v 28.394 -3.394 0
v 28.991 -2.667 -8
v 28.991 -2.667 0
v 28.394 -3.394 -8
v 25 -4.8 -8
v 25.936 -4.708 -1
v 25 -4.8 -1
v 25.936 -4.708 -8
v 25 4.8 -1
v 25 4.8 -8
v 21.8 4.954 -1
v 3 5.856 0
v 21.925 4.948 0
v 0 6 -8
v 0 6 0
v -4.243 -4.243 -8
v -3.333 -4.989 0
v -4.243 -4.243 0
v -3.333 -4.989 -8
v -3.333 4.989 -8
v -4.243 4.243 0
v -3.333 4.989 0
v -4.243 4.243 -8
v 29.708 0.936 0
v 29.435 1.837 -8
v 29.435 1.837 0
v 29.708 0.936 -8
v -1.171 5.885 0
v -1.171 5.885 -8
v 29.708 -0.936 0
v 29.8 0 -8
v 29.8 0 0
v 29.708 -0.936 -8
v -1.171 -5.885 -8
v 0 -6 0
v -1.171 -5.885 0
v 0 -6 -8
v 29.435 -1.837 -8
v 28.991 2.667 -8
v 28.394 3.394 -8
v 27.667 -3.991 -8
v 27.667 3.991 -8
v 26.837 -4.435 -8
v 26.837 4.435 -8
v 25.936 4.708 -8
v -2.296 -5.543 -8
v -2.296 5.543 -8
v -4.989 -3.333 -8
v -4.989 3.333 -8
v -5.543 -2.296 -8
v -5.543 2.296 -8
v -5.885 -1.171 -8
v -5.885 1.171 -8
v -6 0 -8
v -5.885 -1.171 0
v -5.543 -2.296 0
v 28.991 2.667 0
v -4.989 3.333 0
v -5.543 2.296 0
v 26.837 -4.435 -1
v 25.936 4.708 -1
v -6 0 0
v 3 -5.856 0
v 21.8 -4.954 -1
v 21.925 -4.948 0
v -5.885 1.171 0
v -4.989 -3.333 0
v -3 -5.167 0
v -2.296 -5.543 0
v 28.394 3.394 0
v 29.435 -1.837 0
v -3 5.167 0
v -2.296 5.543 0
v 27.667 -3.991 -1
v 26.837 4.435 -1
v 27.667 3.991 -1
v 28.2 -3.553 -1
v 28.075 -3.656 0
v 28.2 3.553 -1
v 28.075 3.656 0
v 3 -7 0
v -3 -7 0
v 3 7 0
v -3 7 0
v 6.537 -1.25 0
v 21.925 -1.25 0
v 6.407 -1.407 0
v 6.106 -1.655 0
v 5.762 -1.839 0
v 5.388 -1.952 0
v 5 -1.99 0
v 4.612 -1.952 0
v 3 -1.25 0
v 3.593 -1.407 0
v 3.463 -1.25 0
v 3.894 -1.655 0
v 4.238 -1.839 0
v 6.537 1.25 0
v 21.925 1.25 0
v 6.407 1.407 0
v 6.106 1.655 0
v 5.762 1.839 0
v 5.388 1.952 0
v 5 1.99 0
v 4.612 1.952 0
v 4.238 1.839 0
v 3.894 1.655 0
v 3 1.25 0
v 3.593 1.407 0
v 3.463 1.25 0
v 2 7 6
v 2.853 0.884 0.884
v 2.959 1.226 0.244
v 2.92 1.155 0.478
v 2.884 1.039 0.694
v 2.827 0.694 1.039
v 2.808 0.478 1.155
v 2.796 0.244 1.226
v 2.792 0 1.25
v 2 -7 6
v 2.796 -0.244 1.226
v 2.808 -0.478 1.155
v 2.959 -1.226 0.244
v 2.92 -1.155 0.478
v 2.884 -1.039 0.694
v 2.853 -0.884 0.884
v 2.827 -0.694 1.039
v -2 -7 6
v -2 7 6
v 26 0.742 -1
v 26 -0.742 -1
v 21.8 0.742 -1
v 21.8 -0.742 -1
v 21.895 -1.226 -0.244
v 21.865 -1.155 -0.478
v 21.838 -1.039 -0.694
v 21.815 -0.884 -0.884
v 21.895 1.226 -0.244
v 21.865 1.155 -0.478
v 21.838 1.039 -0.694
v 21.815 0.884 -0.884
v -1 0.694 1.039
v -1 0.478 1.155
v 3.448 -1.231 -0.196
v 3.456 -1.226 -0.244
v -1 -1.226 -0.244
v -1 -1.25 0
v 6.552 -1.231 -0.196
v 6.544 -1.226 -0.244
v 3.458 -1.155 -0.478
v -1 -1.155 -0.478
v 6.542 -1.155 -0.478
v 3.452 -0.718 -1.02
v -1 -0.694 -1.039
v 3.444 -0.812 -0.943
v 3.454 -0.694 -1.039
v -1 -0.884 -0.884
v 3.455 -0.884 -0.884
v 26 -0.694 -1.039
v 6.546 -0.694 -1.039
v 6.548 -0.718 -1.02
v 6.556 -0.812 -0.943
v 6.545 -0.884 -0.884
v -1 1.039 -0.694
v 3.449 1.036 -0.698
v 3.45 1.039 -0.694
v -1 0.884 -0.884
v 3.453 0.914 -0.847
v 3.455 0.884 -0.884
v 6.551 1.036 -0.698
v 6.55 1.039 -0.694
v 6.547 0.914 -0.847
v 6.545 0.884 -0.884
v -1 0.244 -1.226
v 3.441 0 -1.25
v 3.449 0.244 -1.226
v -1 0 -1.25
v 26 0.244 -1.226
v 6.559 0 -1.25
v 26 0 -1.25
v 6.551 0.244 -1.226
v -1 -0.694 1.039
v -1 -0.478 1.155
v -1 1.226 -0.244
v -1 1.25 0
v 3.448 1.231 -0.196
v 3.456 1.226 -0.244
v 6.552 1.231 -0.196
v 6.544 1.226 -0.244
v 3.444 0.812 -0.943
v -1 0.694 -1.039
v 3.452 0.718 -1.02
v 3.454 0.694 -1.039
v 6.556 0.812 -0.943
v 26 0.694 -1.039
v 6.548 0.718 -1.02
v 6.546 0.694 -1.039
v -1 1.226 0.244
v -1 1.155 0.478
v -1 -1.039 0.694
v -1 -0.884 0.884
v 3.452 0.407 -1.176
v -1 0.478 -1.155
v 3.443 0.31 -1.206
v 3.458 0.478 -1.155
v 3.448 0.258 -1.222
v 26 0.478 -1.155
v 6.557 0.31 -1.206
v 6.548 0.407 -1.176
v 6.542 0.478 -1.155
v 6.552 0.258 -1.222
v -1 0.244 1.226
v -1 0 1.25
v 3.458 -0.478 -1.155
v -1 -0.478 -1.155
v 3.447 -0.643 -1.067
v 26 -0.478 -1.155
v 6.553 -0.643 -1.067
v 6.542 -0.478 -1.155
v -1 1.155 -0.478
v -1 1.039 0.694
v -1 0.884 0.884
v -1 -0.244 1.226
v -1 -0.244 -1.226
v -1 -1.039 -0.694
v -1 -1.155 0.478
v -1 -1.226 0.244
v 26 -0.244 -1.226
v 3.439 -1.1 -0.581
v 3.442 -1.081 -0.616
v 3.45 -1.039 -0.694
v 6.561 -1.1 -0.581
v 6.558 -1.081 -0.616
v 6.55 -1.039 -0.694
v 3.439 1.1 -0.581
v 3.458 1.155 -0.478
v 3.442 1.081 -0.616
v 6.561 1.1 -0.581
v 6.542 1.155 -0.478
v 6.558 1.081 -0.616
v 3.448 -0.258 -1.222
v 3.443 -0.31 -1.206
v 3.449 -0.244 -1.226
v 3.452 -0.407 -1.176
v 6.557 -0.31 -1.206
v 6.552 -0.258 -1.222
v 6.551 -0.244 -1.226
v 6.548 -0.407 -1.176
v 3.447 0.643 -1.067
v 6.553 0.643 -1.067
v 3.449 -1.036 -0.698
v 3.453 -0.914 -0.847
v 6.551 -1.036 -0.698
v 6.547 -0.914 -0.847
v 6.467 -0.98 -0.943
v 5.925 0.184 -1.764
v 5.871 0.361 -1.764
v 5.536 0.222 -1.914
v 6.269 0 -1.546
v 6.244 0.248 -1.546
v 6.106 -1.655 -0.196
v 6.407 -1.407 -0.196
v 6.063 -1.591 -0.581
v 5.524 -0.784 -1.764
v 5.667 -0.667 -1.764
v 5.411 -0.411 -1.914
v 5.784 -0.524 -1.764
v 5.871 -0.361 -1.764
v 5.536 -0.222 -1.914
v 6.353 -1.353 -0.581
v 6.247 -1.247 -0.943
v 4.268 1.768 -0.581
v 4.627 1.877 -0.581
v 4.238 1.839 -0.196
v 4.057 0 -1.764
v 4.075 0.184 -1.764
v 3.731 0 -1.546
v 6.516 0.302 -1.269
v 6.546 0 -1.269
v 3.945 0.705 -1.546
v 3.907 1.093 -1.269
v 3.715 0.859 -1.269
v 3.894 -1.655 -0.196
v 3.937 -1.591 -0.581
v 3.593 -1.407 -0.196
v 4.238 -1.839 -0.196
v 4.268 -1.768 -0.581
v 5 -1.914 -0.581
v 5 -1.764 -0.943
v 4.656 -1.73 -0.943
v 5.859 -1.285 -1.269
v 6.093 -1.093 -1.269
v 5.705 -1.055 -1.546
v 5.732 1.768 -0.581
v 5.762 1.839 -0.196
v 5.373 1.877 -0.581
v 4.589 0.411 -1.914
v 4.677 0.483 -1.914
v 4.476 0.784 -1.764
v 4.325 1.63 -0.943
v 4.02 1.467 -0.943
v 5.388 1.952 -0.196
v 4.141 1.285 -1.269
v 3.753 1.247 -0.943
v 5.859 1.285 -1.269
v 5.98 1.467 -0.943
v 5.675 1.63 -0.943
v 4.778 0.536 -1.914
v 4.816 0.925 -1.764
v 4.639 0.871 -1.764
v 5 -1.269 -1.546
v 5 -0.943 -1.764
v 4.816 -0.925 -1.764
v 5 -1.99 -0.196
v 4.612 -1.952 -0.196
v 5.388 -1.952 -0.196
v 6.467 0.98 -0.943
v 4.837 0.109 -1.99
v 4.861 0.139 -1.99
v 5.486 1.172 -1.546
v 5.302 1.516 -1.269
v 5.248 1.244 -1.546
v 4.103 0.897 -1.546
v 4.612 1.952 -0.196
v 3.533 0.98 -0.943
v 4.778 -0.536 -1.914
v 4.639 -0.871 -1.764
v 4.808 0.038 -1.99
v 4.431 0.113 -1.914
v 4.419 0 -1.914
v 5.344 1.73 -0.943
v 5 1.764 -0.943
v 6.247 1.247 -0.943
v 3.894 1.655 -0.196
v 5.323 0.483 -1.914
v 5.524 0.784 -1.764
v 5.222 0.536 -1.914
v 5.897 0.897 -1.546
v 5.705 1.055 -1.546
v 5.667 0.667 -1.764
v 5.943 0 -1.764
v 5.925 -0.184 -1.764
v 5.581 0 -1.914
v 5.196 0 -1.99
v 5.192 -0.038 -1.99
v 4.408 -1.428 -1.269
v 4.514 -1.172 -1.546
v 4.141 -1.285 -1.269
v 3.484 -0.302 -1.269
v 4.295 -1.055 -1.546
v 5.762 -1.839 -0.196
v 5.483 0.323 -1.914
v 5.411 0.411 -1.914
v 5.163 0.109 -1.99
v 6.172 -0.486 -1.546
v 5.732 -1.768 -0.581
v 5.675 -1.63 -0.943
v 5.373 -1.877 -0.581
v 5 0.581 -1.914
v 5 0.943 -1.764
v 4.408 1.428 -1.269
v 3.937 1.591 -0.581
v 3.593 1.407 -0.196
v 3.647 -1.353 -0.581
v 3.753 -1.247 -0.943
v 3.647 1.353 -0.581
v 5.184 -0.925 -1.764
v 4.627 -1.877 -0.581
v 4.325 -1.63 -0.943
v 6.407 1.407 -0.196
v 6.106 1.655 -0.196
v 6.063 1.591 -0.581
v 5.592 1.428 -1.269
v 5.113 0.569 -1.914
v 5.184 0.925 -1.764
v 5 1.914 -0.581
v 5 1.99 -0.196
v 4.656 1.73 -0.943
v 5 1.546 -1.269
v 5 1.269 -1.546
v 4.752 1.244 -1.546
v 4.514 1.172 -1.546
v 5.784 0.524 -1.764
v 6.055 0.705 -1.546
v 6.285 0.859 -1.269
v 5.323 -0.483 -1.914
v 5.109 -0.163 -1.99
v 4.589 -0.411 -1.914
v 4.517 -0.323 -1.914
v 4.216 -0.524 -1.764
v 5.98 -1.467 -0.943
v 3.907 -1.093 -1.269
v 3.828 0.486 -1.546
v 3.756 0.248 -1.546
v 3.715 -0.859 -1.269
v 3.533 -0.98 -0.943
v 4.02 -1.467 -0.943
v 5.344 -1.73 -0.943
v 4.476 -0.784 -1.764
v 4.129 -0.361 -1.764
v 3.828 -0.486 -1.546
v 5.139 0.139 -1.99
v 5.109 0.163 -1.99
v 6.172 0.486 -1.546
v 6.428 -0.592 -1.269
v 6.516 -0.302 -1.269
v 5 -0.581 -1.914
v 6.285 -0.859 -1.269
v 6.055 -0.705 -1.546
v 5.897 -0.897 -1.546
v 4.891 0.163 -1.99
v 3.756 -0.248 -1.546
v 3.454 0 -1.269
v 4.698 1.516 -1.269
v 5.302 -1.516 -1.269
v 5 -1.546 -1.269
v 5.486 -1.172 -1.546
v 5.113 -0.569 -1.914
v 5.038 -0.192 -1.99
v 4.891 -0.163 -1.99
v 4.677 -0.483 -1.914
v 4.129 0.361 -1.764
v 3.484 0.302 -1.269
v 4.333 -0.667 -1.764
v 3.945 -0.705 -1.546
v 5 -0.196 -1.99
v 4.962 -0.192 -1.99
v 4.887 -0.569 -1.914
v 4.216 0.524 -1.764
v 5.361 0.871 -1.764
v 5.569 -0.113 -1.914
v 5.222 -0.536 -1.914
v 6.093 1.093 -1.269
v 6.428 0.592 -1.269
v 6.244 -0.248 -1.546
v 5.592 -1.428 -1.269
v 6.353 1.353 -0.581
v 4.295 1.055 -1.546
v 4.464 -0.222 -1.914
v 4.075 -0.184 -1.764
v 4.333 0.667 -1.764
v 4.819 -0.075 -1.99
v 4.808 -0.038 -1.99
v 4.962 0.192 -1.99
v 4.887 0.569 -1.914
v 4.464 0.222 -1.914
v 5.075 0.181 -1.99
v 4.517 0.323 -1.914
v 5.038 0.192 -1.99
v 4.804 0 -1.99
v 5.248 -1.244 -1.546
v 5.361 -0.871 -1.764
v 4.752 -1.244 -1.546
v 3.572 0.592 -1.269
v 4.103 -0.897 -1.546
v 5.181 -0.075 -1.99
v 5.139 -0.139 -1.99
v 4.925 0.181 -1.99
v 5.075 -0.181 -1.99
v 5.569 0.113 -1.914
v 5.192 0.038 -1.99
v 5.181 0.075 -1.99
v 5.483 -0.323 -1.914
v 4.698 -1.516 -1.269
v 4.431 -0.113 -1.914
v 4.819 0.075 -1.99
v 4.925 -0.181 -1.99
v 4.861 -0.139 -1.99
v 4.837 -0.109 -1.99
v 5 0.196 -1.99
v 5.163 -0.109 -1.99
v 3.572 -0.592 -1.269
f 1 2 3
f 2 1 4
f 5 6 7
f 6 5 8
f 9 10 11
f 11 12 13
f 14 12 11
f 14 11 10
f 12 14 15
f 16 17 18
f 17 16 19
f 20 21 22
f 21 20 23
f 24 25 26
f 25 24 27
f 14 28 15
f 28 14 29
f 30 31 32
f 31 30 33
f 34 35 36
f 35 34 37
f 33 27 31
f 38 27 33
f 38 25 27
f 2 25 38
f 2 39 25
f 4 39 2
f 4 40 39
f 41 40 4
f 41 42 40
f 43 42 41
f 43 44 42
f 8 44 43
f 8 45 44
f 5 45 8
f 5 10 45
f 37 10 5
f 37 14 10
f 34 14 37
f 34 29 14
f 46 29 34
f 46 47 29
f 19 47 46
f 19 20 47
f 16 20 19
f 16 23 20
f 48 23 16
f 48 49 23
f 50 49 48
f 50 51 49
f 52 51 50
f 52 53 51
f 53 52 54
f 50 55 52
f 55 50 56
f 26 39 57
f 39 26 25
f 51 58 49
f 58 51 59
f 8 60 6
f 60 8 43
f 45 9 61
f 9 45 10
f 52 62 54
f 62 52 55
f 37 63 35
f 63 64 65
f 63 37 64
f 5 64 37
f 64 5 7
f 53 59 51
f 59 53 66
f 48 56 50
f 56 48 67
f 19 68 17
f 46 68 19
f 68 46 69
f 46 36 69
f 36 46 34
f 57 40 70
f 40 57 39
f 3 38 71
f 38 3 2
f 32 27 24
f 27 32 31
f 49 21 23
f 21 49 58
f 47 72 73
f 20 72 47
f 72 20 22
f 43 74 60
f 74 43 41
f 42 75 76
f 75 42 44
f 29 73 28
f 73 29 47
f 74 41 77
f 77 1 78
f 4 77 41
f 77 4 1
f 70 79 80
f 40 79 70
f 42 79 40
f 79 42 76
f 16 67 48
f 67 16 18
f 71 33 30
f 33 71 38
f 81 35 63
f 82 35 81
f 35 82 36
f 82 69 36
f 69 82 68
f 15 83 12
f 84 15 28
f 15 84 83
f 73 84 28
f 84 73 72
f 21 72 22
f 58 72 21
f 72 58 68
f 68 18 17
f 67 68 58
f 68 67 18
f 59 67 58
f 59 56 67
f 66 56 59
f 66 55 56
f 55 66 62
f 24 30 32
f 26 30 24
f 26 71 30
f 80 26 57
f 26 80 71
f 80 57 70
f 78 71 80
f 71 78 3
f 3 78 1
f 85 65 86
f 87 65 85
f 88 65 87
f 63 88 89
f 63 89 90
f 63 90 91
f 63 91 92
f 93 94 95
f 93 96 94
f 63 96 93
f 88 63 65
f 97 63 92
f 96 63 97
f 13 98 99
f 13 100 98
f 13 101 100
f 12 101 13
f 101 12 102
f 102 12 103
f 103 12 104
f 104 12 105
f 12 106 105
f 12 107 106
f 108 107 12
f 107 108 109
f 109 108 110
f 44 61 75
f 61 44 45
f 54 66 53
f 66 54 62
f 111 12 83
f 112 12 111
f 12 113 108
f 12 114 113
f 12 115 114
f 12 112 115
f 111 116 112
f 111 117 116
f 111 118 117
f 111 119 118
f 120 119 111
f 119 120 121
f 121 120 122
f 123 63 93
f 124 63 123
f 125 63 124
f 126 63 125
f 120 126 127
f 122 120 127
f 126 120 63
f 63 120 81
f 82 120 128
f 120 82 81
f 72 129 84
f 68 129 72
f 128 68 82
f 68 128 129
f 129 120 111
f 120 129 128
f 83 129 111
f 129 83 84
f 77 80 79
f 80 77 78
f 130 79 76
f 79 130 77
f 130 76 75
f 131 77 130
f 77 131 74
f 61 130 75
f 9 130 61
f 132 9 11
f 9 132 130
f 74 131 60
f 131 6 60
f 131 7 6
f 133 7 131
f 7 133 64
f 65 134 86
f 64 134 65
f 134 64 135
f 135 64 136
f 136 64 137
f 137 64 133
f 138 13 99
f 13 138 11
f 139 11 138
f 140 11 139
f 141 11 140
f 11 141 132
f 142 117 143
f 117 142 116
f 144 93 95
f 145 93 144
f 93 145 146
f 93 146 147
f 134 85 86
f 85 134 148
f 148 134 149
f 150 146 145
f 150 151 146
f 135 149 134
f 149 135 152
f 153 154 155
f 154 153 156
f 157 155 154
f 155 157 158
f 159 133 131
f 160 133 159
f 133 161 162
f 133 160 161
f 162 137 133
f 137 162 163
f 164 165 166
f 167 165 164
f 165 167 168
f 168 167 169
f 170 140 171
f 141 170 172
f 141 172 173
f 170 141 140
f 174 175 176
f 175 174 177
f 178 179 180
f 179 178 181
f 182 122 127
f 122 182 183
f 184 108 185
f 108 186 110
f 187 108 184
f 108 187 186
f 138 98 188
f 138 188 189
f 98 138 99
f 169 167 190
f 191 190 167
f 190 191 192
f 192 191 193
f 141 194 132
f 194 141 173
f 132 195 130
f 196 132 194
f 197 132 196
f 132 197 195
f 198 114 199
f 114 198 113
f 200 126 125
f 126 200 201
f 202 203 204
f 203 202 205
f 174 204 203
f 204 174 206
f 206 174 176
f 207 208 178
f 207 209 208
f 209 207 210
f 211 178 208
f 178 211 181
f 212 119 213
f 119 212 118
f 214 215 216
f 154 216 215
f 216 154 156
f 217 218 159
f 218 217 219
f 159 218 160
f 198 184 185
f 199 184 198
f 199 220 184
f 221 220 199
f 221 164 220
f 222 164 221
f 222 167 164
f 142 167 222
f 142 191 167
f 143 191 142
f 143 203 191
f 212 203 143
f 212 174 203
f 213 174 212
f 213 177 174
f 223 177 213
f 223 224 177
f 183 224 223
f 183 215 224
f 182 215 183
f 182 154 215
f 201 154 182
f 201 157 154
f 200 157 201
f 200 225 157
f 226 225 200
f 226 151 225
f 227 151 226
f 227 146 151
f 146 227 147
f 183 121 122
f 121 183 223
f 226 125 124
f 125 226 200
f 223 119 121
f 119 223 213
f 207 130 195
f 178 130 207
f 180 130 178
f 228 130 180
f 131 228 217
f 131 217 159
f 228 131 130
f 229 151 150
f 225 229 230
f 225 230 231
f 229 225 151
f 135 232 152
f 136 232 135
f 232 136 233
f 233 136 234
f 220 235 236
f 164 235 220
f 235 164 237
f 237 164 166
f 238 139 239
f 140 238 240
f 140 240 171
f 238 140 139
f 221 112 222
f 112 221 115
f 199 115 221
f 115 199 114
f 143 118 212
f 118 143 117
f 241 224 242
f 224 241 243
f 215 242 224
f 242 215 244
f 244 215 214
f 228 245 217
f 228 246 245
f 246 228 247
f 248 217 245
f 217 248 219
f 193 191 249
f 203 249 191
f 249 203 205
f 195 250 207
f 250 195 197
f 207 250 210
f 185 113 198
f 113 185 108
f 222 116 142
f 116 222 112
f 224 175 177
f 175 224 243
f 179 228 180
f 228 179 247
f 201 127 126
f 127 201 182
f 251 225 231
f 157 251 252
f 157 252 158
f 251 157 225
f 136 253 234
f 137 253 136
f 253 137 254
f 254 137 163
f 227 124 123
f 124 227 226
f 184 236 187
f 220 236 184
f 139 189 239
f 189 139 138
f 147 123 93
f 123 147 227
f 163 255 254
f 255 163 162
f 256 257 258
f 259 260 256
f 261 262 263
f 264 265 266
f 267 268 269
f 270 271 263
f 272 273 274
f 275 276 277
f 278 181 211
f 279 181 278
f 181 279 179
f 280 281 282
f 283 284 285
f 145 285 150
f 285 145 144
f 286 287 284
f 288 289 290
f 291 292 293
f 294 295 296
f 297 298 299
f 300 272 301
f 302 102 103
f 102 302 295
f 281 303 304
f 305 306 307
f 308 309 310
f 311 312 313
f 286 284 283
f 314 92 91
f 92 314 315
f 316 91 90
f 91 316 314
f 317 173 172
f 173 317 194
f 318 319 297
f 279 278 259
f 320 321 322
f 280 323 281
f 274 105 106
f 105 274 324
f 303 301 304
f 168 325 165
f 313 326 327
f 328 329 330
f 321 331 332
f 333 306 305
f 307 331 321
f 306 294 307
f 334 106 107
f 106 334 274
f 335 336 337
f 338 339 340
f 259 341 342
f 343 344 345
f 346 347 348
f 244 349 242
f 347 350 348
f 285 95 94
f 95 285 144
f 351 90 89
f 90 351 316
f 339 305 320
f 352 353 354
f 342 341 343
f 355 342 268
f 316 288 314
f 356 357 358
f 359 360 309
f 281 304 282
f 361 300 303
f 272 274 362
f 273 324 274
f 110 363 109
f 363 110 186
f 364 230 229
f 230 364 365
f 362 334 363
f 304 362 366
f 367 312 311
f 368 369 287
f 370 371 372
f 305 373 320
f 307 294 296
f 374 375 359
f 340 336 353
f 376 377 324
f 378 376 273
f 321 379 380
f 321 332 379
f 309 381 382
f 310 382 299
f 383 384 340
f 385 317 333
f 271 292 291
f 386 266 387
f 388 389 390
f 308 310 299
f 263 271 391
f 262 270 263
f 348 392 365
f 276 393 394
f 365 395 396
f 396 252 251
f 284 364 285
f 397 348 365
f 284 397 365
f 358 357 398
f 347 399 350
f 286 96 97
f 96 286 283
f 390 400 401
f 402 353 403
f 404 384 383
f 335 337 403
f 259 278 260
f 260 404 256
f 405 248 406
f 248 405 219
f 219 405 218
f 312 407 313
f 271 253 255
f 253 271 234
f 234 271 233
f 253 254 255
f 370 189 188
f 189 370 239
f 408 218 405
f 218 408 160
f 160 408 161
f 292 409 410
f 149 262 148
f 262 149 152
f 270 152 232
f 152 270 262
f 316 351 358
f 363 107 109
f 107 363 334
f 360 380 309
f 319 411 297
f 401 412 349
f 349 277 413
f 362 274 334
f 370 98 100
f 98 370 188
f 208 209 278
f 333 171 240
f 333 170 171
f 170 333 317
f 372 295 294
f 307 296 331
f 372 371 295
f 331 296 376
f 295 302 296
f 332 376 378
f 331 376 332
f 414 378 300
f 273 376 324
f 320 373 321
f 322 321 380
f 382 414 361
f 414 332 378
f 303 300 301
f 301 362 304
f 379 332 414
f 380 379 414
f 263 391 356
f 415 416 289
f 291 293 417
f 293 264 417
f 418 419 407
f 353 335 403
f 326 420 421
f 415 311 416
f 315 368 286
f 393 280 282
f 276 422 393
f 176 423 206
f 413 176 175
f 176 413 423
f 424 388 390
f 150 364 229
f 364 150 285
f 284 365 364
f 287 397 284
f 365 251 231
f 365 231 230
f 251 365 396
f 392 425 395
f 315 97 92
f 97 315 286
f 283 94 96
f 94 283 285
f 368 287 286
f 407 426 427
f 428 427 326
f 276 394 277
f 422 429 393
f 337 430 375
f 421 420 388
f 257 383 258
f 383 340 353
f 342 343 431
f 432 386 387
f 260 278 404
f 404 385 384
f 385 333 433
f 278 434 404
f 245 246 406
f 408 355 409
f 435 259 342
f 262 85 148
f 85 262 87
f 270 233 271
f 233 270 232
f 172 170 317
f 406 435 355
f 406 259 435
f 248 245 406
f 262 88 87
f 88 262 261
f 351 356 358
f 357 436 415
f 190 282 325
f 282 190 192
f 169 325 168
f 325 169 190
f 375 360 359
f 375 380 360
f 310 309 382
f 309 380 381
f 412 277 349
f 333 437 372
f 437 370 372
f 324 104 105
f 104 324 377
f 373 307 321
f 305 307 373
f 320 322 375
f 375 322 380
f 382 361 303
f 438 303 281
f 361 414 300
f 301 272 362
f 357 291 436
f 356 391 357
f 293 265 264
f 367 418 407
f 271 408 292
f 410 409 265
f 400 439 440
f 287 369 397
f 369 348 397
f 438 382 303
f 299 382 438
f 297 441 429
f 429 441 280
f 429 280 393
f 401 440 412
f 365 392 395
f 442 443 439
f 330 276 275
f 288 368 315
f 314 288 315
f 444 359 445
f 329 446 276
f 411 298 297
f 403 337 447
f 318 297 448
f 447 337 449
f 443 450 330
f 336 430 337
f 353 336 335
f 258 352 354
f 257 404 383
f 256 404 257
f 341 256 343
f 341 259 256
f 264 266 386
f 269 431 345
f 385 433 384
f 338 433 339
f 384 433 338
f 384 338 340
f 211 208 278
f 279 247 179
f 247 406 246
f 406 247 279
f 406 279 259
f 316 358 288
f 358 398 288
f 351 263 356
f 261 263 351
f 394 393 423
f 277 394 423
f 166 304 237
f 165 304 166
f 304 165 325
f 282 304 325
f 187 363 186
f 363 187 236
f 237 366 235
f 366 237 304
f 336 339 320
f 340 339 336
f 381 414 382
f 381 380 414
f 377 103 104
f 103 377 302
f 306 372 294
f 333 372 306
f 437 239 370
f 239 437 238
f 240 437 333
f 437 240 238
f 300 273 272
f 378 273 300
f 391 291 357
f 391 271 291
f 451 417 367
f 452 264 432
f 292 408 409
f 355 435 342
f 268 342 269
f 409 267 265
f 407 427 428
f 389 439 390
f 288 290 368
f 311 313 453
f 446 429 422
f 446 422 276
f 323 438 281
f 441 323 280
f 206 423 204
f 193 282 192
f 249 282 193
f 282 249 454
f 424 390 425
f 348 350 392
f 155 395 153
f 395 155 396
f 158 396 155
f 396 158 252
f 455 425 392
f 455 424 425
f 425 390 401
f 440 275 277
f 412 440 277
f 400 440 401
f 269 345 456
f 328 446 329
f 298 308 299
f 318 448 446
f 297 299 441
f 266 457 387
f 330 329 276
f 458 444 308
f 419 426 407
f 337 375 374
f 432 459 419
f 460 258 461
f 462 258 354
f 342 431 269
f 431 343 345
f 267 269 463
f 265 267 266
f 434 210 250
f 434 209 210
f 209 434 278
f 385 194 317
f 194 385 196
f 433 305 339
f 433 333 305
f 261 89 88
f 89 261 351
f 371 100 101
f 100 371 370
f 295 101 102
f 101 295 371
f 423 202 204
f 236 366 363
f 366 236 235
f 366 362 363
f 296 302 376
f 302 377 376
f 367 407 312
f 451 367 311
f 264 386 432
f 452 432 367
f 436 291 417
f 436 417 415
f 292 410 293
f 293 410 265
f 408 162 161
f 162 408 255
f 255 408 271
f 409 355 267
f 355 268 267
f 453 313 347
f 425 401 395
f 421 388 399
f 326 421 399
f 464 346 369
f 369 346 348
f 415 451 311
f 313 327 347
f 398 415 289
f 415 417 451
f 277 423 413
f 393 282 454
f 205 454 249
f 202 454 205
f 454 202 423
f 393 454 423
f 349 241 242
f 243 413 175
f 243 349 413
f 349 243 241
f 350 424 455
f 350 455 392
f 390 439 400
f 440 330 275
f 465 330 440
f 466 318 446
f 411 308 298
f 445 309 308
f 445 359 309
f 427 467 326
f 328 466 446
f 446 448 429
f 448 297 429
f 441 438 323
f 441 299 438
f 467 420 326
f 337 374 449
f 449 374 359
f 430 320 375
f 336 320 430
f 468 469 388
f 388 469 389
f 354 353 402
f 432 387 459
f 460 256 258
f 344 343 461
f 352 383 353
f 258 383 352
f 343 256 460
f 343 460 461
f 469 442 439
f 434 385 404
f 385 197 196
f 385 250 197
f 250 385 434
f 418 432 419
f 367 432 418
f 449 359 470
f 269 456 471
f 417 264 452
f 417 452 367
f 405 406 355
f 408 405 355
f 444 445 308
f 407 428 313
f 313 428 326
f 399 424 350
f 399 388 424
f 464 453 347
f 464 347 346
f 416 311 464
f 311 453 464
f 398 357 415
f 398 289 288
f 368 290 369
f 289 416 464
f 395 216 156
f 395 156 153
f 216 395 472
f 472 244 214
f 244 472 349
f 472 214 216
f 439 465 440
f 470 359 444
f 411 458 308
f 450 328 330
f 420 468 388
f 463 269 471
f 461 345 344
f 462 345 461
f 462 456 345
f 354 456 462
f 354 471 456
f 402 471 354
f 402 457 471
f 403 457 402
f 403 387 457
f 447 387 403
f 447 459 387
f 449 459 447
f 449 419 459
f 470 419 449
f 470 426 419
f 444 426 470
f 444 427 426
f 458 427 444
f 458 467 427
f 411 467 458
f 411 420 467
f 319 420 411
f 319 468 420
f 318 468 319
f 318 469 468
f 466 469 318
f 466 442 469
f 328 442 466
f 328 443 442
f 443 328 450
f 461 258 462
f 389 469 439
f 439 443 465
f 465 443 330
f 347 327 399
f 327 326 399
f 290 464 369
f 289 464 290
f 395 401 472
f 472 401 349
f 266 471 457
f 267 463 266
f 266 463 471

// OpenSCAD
// COBRA-Snap Finger Segment - proximal
// Dovetail slide joints, no glue needed

$fn = 32;

module finger_segment() {
    difference() {
        union() {
            // Main body
            hull() {
                translate([0, 0, -4])
                cylinder(h=8, d=12, center=true);
                
                translate([25.0, 0, -4])
                cylinder(h=8, d=9.600000000000001, center=true);
            }
            
            // Male dovetail (proximal end)
            translate([0, 0, 0])
            rotate([90, 0, 0])
            linear_extrude(height=14, center=true)
            polygon(points=[[-3, 0], [3, 0], [2, 6], [-2, 6]]);
        }
        
        // Female dovetail socket (distal end) - skip for distal
        
        translate([25.0, 0, 0])
        rotate([90, 0, 0])
        linear_extrude(height=11.600000000000001, center=true)
        polygon(points=[[-3.2, -1], [3.2, -1], [2.2, 7], [-2.2, 7]]);
        
        
        // Tendon channel
        translate([12.5, 0, 0])
        rotate([0, 90, 0])
        cylinder(h=27.0, d=2.5, center=true);
        
        // Quick-connect socket for tendon
        translate([5, 0, 0])
        sphere(d=4);
    }
}

finger_segment();
